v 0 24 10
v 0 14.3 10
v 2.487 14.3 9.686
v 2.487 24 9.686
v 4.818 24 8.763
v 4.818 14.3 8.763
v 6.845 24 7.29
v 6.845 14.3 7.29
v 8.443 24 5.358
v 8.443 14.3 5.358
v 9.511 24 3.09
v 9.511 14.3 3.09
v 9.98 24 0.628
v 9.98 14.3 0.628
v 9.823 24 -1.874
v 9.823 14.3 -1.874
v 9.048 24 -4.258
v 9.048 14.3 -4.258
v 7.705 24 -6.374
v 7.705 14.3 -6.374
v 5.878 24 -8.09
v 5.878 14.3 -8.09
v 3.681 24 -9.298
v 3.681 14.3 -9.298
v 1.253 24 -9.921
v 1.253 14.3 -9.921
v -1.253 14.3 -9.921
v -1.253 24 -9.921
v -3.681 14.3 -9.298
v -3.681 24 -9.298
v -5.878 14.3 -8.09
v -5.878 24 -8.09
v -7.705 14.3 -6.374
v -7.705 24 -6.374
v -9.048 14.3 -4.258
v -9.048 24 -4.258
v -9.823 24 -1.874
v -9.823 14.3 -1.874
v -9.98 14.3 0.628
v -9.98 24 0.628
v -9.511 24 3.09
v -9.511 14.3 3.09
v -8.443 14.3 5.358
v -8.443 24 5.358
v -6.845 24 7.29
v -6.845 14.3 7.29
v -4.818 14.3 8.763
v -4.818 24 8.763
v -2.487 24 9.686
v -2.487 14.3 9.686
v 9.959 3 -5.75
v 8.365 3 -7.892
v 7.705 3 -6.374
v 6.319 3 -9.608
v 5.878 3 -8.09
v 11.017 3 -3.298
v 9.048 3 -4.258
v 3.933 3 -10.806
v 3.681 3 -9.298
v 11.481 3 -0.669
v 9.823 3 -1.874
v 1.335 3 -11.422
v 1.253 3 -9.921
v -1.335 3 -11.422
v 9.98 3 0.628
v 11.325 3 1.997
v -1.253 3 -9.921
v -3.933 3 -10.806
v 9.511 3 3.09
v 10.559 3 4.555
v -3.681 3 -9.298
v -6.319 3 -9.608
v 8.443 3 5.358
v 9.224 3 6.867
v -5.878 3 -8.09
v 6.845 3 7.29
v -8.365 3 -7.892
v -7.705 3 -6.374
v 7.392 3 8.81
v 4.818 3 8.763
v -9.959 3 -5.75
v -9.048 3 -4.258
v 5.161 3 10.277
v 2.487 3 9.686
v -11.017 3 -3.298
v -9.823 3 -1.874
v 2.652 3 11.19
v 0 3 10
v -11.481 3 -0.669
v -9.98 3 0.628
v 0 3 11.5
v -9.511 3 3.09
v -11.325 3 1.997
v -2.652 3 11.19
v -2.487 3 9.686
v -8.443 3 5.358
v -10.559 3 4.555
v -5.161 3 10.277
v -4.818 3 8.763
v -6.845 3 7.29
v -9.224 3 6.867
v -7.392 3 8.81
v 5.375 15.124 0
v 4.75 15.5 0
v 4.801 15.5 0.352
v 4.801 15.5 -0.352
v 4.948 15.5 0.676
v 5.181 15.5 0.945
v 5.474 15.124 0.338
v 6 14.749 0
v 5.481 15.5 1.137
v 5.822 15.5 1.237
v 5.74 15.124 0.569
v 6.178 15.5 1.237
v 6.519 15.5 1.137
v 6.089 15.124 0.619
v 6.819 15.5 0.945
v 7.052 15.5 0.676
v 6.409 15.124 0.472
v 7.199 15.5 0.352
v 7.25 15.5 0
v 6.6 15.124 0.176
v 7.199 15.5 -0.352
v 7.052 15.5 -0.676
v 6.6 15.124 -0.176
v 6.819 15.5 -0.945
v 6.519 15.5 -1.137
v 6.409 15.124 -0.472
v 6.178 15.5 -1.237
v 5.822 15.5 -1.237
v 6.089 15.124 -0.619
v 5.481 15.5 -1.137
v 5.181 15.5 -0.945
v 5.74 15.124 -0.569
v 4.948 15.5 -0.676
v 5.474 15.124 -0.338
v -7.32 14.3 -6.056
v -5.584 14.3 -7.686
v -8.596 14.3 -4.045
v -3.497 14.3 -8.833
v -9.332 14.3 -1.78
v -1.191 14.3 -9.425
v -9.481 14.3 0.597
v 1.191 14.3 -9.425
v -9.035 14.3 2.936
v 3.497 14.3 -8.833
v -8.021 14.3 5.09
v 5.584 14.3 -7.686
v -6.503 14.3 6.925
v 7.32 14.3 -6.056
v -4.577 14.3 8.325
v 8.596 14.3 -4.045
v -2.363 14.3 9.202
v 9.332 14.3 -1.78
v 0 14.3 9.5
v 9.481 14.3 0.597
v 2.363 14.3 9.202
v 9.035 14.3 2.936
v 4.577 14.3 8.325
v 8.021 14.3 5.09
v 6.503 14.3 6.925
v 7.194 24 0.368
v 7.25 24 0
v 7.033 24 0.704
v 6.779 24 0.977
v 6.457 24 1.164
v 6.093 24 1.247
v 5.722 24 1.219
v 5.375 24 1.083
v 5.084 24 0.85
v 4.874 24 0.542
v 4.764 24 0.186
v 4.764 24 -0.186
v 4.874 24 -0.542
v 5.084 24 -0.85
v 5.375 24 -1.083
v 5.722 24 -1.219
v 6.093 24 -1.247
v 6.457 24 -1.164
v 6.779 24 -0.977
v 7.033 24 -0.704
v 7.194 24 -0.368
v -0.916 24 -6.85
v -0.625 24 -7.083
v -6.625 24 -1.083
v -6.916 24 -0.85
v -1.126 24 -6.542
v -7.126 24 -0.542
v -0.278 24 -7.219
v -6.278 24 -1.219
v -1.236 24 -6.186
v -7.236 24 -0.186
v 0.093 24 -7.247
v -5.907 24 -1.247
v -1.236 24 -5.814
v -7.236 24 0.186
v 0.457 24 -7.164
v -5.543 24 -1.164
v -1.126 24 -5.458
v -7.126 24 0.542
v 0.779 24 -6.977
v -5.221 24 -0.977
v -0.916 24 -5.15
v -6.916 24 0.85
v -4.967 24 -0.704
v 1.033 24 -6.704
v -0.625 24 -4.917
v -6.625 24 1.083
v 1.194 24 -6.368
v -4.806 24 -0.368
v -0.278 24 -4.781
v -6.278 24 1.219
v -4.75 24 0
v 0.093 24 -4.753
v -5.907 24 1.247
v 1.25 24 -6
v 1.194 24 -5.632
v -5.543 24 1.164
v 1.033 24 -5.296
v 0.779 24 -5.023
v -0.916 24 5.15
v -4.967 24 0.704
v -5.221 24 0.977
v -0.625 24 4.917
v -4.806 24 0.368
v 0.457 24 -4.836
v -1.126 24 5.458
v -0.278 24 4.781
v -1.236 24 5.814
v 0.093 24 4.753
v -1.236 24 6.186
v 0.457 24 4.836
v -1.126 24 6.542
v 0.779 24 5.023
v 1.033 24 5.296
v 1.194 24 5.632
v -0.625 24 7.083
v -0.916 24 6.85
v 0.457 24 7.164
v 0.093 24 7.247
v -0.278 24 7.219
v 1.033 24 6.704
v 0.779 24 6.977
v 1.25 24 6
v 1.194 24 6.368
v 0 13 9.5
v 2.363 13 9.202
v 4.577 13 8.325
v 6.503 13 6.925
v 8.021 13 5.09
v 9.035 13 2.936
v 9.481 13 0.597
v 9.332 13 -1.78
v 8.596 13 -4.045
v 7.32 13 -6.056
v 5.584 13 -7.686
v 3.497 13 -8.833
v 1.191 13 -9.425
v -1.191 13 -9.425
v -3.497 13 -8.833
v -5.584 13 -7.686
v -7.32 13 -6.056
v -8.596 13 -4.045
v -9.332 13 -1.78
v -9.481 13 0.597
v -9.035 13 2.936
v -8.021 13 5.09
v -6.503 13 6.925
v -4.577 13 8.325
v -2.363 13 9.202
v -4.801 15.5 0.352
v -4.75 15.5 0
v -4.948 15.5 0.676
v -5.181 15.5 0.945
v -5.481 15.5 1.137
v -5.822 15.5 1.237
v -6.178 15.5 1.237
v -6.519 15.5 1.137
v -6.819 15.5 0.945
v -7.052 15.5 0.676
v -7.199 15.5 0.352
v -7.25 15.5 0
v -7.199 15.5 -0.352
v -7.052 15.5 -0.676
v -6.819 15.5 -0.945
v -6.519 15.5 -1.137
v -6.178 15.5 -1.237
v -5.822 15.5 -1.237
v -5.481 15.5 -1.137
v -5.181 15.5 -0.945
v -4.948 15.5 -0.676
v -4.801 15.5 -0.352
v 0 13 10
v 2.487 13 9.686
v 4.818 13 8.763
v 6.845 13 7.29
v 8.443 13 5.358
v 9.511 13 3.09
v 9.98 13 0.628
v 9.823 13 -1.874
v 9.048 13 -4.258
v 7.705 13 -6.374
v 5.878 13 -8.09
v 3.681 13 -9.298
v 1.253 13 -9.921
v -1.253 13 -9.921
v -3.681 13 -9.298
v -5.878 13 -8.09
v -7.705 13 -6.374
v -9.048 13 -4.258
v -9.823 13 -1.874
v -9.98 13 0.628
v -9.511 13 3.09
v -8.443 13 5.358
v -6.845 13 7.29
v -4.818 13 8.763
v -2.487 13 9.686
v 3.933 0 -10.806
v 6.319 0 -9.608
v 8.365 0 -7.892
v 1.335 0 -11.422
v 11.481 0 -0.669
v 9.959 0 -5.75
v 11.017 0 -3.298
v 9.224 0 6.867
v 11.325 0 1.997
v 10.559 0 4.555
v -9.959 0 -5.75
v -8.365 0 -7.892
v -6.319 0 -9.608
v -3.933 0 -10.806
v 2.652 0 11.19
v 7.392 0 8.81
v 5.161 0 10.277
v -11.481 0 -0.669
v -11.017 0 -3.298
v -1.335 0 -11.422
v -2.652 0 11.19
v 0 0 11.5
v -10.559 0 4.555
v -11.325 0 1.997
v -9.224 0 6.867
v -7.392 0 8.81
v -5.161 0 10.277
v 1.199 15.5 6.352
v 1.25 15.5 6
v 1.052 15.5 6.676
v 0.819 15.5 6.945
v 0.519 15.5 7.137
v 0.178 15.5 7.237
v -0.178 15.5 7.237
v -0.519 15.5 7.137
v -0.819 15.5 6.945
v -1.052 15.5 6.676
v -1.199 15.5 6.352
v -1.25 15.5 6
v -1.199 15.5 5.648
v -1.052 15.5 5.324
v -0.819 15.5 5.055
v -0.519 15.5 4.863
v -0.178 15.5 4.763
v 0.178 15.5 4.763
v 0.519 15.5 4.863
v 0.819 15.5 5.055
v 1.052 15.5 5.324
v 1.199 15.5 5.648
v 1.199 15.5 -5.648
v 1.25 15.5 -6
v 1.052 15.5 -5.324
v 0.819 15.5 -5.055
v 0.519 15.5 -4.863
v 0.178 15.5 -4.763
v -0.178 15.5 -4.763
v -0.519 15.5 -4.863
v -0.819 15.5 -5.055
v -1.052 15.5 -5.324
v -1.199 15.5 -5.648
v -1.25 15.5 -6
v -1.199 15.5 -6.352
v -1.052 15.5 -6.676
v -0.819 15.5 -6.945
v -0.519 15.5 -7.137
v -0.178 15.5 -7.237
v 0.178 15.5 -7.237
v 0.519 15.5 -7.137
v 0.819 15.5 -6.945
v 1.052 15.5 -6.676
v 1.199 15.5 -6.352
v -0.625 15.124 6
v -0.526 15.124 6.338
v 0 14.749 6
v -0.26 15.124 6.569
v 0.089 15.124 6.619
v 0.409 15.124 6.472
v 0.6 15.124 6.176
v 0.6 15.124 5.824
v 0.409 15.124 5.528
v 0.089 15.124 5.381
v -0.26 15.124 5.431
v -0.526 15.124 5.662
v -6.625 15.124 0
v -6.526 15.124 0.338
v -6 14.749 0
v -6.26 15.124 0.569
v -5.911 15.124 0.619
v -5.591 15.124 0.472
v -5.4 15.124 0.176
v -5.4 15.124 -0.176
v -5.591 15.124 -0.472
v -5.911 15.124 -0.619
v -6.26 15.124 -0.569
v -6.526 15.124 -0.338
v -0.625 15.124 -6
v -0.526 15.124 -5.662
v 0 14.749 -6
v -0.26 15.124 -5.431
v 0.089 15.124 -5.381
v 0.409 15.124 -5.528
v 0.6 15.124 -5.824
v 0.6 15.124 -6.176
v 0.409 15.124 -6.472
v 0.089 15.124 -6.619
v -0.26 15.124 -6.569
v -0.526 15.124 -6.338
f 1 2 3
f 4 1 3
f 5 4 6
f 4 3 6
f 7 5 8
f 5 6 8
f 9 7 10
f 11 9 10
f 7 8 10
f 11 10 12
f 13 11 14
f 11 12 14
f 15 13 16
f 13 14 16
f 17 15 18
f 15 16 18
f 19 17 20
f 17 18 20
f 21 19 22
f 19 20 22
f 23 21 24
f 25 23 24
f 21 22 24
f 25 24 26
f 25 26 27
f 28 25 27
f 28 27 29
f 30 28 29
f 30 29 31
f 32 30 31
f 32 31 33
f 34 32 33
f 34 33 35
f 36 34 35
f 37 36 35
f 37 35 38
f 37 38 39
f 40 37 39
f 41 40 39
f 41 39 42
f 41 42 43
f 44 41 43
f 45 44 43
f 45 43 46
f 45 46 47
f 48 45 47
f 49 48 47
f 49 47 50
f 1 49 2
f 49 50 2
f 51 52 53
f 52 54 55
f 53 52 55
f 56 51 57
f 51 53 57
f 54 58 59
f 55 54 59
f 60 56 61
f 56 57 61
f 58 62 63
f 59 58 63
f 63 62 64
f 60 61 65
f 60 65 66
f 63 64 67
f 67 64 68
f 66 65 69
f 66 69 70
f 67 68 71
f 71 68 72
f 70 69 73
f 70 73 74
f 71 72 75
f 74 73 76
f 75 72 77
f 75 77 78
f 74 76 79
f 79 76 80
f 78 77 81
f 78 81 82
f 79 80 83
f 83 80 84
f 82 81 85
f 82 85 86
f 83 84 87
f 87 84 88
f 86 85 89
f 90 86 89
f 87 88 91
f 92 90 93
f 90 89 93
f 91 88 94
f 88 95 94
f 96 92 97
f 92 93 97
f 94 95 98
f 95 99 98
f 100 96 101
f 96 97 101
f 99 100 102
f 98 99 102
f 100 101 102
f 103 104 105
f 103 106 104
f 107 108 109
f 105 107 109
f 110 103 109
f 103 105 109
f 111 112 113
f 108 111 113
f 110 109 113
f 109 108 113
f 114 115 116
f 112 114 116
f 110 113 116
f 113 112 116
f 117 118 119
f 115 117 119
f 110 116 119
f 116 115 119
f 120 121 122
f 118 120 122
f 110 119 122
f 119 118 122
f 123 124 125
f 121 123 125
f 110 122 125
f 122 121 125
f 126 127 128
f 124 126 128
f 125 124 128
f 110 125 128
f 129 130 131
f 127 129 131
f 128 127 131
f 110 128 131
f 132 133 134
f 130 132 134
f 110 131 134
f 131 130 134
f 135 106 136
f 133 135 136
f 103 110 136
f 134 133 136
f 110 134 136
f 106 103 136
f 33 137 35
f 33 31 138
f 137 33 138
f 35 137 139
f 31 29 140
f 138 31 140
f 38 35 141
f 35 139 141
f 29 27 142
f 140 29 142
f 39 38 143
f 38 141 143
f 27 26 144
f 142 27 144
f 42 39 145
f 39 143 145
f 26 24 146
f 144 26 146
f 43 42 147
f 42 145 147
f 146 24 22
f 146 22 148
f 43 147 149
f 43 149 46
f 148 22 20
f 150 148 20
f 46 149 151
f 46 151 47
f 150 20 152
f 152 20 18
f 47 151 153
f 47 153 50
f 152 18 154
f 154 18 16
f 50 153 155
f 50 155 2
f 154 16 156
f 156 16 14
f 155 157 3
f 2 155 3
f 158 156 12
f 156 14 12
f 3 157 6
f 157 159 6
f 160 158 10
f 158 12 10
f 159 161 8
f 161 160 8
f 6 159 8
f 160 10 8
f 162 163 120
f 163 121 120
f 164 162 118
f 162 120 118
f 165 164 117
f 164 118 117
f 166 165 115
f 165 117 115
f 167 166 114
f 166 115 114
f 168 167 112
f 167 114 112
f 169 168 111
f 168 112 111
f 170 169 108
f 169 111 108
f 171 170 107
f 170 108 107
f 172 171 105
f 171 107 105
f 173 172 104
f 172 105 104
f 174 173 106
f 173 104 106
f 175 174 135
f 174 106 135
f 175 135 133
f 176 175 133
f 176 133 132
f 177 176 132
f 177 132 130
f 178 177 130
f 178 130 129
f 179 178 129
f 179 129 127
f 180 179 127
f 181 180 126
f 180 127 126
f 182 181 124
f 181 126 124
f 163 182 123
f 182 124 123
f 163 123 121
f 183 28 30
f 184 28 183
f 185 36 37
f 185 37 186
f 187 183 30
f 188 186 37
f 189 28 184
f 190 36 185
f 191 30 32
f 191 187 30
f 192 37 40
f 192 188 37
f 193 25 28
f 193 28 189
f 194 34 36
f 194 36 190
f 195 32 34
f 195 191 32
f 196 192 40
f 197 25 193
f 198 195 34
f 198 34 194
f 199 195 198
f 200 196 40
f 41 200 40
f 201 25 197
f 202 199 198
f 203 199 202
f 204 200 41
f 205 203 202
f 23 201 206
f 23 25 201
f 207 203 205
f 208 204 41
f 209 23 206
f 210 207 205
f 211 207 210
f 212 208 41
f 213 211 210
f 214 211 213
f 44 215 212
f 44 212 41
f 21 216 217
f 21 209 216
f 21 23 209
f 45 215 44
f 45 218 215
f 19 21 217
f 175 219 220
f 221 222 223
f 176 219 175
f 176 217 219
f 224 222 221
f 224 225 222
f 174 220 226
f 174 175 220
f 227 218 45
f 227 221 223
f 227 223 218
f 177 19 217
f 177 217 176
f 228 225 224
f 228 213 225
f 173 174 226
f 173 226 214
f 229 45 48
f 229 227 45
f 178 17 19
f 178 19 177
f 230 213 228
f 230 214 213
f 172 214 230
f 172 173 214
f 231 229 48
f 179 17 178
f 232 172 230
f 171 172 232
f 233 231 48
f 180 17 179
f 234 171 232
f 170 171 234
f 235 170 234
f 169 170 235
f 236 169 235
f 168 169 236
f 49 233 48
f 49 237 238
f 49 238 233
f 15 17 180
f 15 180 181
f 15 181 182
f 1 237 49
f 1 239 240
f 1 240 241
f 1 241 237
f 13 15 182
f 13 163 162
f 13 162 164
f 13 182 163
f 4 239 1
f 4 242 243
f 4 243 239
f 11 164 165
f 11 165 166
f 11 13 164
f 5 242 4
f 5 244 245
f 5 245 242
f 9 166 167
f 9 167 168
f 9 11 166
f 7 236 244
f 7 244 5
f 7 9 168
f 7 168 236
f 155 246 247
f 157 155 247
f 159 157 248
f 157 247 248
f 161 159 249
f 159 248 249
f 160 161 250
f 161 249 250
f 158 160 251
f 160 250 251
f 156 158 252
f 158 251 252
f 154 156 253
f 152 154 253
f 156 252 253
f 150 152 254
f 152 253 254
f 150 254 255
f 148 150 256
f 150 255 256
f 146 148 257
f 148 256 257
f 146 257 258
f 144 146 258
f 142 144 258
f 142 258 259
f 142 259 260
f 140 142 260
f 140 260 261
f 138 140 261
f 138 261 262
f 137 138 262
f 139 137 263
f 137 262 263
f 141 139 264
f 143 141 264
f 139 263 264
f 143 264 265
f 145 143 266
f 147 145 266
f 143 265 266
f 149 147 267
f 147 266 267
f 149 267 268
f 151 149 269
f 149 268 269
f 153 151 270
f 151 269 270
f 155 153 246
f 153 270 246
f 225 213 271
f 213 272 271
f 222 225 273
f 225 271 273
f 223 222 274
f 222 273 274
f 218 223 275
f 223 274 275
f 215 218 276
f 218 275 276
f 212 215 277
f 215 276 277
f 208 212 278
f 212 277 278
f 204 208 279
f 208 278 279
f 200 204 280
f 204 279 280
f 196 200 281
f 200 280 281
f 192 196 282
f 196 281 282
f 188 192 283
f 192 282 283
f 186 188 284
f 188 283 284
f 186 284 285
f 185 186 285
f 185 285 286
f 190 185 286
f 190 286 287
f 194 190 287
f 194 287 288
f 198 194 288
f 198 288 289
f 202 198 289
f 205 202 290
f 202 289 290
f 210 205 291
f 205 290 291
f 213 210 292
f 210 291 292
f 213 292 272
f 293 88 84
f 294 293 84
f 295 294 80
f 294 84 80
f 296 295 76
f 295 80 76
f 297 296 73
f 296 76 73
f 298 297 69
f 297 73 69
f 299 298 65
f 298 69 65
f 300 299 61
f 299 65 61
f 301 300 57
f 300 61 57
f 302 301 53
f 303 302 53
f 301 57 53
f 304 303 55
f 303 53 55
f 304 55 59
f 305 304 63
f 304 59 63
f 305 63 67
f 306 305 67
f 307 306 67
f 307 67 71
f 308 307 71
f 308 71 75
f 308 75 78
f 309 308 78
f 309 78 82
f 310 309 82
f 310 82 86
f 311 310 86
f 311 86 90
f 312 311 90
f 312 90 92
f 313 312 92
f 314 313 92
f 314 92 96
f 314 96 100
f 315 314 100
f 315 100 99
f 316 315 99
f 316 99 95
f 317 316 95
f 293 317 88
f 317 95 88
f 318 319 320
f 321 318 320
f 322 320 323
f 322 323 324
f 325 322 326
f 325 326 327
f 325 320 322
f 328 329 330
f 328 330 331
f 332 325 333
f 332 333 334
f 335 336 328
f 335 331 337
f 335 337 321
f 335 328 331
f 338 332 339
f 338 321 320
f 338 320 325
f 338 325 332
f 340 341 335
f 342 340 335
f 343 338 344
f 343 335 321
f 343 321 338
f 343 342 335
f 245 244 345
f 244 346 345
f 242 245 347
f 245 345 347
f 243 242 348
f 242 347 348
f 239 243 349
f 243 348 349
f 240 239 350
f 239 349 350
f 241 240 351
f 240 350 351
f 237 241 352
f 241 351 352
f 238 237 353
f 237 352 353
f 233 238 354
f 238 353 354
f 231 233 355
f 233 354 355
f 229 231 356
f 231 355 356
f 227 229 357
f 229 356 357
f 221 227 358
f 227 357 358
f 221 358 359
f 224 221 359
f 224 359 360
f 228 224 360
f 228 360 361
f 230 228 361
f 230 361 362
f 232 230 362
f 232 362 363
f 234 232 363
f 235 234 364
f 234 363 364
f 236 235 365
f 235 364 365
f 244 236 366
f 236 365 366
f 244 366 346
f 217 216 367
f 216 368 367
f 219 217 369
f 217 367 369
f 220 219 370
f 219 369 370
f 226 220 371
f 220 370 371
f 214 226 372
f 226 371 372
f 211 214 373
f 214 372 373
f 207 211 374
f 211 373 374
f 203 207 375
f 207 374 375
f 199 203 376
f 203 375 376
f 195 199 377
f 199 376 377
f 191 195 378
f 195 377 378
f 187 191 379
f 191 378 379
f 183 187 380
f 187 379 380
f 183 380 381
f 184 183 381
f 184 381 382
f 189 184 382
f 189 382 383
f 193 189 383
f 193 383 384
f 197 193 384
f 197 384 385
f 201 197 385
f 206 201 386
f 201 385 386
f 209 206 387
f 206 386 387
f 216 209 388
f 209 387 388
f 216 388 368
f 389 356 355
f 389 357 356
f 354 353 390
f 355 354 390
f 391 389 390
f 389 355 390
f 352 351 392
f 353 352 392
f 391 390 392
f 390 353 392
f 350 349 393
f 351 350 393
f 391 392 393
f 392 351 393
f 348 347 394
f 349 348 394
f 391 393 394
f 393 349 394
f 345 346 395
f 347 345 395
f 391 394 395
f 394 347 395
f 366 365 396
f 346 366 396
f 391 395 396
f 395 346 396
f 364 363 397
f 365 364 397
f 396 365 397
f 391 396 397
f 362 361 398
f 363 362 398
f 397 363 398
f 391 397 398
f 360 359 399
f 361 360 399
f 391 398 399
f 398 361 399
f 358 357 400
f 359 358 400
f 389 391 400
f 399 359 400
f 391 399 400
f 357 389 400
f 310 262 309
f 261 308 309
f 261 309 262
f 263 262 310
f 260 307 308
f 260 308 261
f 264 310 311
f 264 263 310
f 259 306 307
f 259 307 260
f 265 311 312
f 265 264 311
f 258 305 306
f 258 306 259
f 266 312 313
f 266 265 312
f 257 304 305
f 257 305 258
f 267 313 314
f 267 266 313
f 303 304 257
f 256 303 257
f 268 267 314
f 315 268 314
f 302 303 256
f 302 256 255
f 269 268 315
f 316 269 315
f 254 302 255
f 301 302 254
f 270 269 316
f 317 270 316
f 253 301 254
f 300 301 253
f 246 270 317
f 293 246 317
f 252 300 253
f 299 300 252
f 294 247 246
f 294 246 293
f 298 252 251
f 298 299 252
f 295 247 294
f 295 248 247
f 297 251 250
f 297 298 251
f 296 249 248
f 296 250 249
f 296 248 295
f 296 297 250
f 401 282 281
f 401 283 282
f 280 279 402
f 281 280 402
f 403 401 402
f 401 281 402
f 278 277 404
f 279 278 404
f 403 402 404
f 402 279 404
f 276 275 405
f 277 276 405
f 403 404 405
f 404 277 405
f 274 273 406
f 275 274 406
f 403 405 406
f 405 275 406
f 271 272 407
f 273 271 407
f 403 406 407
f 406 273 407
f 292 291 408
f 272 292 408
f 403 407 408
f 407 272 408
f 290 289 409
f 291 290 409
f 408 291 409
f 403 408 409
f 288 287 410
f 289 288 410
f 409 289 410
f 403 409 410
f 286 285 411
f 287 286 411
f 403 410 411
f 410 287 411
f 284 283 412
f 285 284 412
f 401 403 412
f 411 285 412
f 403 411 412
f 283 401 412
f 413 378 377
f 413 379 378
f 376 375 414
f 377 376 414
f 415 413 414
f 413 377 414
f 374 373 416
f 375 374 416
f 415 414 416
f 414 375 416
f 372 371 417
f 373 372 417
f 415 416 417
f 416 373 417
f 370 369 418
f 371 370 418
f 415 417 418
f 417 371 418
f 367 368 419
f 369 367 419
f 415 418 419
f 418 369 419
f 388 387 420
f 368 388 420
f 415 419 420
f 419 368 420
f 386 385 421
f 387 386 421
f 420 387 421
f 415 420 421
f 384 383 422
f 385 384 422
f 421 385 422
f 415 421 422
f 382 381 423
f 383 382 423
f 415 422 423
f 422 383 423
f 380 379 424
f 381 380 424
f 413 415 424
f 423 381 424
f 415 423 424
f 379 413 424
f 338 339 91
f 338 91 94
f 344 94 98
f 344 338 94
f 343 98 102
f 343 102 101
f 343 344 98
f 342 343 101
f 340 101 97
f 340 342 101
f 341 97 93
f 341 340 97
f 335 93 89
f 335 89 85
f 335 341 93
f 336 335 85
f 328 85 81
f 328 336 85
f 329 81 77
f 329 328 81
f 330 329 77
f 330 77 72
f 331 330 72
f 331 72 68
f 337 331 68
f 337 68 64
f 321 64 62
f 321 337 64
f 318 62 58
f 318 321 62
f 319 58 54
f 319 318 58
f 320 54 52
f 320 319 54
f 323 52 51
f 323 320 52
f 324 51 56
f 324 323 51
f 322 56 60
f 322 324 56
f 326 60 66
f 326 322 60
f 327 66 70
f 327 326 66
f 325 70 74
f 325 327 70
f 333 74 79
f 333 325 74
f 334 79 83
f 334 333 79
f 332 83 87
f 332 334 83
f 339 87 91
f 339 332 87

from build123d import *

# Parameters (mm, degrees)
SKETCH_1_R          = 10
EXTRUDE_1_DEPTH     = 24
M3X0_52_D           = 2.5
M3X0_52_DEPTH       = 8.5
M3X0_52_TIP         = 0.751075774
EXTRUDE_START       = 3
SKETCH_10_R         = 11.5
SKETCH_10_R_2       = 10
EXTRUDE_2_DEPTH     = 3
SKETCH_8_R          = 10
SKETCH_8_R_2        = 9.5
CUT_EXTRUDE_1_DEPTH = 1.3


with BuildPart() as part:
    # Эскиз1 → Бобышка-Вытянуть1 (new body)
    with BuildSketch(Plane(origin=(0, 0, 0), x_dir=(1, 0, 0), z_dir=(0, 1, 0))):
        with Locations(Location((0, 0, 0), (0, 0, 270))):
            Circle(SKETCH_1_R)
    extrude(amount=EXTRUDE_1_DEPTH)

    # Отверстие обработанное метчиком M3x0.52
    with Locations(Plane(origin=(-4.838819278, 24, -4.760025704), x_dir=(-1, 0, 0), z_dir=(0, 1, 0))):
        with Locations((-4.838819278, -1.239974296), (-10.838819278, 4.760025704), (-4.838819278, 10.760025704), (1.161180722, 4.760025704)):
            Hole(M3X0_52_D / 2, depth=M3X0_52_DEPTH)
            with Locations((0, 0, -(M3X0_52_DEPTH + M3X0_52_TIP / 2))):  # 118° drill point
                Cone(0, M3X0_52_D / 2, M3X0_52_TIP, mode=Mode.SUBTRACT)

    # Эскиз10 → Бобышка-Вытянуть2 (add)
    with BuildSketch(Plane(origin=(0, 3, 0), x_dir=(-1, 0, 0), z_dir=(0, -1, 0)).offset(EXTRUDE_START)):
        with Locations(Location((0, 0, 0), (0, 0, 270))):
            Circle(SKETCH_10_R)
        with Locations(Location((0, 0, 0), (0, 0, 90))):
            Circle(SKETCH_10_R_2, mode=Mode.SUBTRACT)
    extrude(amount=-EXTRUDE_2_DEPTH)

    # Эскиз8 → Вырез-Вытянуть1 (cut)
    with BuildSketch(Plane(origin=(0, 13, 0), x_dir=(1, 0, 0), z_dir=(0, 1, 0))):
        with Locations(Location((0, 0, 0), (0, 0, 270))):
            Circle(SKETCH_8_R)
        with Locations(Location((0, 0, 0), (0, 0, 270))):
            Circle(SKETCH_8_R_2, mode=Mode.SUBTRACT)
    extrude(amount=CUT_EXTRUDE_1_DEPTH, mode=Mode.SUBTRACT)


solid = part.part
